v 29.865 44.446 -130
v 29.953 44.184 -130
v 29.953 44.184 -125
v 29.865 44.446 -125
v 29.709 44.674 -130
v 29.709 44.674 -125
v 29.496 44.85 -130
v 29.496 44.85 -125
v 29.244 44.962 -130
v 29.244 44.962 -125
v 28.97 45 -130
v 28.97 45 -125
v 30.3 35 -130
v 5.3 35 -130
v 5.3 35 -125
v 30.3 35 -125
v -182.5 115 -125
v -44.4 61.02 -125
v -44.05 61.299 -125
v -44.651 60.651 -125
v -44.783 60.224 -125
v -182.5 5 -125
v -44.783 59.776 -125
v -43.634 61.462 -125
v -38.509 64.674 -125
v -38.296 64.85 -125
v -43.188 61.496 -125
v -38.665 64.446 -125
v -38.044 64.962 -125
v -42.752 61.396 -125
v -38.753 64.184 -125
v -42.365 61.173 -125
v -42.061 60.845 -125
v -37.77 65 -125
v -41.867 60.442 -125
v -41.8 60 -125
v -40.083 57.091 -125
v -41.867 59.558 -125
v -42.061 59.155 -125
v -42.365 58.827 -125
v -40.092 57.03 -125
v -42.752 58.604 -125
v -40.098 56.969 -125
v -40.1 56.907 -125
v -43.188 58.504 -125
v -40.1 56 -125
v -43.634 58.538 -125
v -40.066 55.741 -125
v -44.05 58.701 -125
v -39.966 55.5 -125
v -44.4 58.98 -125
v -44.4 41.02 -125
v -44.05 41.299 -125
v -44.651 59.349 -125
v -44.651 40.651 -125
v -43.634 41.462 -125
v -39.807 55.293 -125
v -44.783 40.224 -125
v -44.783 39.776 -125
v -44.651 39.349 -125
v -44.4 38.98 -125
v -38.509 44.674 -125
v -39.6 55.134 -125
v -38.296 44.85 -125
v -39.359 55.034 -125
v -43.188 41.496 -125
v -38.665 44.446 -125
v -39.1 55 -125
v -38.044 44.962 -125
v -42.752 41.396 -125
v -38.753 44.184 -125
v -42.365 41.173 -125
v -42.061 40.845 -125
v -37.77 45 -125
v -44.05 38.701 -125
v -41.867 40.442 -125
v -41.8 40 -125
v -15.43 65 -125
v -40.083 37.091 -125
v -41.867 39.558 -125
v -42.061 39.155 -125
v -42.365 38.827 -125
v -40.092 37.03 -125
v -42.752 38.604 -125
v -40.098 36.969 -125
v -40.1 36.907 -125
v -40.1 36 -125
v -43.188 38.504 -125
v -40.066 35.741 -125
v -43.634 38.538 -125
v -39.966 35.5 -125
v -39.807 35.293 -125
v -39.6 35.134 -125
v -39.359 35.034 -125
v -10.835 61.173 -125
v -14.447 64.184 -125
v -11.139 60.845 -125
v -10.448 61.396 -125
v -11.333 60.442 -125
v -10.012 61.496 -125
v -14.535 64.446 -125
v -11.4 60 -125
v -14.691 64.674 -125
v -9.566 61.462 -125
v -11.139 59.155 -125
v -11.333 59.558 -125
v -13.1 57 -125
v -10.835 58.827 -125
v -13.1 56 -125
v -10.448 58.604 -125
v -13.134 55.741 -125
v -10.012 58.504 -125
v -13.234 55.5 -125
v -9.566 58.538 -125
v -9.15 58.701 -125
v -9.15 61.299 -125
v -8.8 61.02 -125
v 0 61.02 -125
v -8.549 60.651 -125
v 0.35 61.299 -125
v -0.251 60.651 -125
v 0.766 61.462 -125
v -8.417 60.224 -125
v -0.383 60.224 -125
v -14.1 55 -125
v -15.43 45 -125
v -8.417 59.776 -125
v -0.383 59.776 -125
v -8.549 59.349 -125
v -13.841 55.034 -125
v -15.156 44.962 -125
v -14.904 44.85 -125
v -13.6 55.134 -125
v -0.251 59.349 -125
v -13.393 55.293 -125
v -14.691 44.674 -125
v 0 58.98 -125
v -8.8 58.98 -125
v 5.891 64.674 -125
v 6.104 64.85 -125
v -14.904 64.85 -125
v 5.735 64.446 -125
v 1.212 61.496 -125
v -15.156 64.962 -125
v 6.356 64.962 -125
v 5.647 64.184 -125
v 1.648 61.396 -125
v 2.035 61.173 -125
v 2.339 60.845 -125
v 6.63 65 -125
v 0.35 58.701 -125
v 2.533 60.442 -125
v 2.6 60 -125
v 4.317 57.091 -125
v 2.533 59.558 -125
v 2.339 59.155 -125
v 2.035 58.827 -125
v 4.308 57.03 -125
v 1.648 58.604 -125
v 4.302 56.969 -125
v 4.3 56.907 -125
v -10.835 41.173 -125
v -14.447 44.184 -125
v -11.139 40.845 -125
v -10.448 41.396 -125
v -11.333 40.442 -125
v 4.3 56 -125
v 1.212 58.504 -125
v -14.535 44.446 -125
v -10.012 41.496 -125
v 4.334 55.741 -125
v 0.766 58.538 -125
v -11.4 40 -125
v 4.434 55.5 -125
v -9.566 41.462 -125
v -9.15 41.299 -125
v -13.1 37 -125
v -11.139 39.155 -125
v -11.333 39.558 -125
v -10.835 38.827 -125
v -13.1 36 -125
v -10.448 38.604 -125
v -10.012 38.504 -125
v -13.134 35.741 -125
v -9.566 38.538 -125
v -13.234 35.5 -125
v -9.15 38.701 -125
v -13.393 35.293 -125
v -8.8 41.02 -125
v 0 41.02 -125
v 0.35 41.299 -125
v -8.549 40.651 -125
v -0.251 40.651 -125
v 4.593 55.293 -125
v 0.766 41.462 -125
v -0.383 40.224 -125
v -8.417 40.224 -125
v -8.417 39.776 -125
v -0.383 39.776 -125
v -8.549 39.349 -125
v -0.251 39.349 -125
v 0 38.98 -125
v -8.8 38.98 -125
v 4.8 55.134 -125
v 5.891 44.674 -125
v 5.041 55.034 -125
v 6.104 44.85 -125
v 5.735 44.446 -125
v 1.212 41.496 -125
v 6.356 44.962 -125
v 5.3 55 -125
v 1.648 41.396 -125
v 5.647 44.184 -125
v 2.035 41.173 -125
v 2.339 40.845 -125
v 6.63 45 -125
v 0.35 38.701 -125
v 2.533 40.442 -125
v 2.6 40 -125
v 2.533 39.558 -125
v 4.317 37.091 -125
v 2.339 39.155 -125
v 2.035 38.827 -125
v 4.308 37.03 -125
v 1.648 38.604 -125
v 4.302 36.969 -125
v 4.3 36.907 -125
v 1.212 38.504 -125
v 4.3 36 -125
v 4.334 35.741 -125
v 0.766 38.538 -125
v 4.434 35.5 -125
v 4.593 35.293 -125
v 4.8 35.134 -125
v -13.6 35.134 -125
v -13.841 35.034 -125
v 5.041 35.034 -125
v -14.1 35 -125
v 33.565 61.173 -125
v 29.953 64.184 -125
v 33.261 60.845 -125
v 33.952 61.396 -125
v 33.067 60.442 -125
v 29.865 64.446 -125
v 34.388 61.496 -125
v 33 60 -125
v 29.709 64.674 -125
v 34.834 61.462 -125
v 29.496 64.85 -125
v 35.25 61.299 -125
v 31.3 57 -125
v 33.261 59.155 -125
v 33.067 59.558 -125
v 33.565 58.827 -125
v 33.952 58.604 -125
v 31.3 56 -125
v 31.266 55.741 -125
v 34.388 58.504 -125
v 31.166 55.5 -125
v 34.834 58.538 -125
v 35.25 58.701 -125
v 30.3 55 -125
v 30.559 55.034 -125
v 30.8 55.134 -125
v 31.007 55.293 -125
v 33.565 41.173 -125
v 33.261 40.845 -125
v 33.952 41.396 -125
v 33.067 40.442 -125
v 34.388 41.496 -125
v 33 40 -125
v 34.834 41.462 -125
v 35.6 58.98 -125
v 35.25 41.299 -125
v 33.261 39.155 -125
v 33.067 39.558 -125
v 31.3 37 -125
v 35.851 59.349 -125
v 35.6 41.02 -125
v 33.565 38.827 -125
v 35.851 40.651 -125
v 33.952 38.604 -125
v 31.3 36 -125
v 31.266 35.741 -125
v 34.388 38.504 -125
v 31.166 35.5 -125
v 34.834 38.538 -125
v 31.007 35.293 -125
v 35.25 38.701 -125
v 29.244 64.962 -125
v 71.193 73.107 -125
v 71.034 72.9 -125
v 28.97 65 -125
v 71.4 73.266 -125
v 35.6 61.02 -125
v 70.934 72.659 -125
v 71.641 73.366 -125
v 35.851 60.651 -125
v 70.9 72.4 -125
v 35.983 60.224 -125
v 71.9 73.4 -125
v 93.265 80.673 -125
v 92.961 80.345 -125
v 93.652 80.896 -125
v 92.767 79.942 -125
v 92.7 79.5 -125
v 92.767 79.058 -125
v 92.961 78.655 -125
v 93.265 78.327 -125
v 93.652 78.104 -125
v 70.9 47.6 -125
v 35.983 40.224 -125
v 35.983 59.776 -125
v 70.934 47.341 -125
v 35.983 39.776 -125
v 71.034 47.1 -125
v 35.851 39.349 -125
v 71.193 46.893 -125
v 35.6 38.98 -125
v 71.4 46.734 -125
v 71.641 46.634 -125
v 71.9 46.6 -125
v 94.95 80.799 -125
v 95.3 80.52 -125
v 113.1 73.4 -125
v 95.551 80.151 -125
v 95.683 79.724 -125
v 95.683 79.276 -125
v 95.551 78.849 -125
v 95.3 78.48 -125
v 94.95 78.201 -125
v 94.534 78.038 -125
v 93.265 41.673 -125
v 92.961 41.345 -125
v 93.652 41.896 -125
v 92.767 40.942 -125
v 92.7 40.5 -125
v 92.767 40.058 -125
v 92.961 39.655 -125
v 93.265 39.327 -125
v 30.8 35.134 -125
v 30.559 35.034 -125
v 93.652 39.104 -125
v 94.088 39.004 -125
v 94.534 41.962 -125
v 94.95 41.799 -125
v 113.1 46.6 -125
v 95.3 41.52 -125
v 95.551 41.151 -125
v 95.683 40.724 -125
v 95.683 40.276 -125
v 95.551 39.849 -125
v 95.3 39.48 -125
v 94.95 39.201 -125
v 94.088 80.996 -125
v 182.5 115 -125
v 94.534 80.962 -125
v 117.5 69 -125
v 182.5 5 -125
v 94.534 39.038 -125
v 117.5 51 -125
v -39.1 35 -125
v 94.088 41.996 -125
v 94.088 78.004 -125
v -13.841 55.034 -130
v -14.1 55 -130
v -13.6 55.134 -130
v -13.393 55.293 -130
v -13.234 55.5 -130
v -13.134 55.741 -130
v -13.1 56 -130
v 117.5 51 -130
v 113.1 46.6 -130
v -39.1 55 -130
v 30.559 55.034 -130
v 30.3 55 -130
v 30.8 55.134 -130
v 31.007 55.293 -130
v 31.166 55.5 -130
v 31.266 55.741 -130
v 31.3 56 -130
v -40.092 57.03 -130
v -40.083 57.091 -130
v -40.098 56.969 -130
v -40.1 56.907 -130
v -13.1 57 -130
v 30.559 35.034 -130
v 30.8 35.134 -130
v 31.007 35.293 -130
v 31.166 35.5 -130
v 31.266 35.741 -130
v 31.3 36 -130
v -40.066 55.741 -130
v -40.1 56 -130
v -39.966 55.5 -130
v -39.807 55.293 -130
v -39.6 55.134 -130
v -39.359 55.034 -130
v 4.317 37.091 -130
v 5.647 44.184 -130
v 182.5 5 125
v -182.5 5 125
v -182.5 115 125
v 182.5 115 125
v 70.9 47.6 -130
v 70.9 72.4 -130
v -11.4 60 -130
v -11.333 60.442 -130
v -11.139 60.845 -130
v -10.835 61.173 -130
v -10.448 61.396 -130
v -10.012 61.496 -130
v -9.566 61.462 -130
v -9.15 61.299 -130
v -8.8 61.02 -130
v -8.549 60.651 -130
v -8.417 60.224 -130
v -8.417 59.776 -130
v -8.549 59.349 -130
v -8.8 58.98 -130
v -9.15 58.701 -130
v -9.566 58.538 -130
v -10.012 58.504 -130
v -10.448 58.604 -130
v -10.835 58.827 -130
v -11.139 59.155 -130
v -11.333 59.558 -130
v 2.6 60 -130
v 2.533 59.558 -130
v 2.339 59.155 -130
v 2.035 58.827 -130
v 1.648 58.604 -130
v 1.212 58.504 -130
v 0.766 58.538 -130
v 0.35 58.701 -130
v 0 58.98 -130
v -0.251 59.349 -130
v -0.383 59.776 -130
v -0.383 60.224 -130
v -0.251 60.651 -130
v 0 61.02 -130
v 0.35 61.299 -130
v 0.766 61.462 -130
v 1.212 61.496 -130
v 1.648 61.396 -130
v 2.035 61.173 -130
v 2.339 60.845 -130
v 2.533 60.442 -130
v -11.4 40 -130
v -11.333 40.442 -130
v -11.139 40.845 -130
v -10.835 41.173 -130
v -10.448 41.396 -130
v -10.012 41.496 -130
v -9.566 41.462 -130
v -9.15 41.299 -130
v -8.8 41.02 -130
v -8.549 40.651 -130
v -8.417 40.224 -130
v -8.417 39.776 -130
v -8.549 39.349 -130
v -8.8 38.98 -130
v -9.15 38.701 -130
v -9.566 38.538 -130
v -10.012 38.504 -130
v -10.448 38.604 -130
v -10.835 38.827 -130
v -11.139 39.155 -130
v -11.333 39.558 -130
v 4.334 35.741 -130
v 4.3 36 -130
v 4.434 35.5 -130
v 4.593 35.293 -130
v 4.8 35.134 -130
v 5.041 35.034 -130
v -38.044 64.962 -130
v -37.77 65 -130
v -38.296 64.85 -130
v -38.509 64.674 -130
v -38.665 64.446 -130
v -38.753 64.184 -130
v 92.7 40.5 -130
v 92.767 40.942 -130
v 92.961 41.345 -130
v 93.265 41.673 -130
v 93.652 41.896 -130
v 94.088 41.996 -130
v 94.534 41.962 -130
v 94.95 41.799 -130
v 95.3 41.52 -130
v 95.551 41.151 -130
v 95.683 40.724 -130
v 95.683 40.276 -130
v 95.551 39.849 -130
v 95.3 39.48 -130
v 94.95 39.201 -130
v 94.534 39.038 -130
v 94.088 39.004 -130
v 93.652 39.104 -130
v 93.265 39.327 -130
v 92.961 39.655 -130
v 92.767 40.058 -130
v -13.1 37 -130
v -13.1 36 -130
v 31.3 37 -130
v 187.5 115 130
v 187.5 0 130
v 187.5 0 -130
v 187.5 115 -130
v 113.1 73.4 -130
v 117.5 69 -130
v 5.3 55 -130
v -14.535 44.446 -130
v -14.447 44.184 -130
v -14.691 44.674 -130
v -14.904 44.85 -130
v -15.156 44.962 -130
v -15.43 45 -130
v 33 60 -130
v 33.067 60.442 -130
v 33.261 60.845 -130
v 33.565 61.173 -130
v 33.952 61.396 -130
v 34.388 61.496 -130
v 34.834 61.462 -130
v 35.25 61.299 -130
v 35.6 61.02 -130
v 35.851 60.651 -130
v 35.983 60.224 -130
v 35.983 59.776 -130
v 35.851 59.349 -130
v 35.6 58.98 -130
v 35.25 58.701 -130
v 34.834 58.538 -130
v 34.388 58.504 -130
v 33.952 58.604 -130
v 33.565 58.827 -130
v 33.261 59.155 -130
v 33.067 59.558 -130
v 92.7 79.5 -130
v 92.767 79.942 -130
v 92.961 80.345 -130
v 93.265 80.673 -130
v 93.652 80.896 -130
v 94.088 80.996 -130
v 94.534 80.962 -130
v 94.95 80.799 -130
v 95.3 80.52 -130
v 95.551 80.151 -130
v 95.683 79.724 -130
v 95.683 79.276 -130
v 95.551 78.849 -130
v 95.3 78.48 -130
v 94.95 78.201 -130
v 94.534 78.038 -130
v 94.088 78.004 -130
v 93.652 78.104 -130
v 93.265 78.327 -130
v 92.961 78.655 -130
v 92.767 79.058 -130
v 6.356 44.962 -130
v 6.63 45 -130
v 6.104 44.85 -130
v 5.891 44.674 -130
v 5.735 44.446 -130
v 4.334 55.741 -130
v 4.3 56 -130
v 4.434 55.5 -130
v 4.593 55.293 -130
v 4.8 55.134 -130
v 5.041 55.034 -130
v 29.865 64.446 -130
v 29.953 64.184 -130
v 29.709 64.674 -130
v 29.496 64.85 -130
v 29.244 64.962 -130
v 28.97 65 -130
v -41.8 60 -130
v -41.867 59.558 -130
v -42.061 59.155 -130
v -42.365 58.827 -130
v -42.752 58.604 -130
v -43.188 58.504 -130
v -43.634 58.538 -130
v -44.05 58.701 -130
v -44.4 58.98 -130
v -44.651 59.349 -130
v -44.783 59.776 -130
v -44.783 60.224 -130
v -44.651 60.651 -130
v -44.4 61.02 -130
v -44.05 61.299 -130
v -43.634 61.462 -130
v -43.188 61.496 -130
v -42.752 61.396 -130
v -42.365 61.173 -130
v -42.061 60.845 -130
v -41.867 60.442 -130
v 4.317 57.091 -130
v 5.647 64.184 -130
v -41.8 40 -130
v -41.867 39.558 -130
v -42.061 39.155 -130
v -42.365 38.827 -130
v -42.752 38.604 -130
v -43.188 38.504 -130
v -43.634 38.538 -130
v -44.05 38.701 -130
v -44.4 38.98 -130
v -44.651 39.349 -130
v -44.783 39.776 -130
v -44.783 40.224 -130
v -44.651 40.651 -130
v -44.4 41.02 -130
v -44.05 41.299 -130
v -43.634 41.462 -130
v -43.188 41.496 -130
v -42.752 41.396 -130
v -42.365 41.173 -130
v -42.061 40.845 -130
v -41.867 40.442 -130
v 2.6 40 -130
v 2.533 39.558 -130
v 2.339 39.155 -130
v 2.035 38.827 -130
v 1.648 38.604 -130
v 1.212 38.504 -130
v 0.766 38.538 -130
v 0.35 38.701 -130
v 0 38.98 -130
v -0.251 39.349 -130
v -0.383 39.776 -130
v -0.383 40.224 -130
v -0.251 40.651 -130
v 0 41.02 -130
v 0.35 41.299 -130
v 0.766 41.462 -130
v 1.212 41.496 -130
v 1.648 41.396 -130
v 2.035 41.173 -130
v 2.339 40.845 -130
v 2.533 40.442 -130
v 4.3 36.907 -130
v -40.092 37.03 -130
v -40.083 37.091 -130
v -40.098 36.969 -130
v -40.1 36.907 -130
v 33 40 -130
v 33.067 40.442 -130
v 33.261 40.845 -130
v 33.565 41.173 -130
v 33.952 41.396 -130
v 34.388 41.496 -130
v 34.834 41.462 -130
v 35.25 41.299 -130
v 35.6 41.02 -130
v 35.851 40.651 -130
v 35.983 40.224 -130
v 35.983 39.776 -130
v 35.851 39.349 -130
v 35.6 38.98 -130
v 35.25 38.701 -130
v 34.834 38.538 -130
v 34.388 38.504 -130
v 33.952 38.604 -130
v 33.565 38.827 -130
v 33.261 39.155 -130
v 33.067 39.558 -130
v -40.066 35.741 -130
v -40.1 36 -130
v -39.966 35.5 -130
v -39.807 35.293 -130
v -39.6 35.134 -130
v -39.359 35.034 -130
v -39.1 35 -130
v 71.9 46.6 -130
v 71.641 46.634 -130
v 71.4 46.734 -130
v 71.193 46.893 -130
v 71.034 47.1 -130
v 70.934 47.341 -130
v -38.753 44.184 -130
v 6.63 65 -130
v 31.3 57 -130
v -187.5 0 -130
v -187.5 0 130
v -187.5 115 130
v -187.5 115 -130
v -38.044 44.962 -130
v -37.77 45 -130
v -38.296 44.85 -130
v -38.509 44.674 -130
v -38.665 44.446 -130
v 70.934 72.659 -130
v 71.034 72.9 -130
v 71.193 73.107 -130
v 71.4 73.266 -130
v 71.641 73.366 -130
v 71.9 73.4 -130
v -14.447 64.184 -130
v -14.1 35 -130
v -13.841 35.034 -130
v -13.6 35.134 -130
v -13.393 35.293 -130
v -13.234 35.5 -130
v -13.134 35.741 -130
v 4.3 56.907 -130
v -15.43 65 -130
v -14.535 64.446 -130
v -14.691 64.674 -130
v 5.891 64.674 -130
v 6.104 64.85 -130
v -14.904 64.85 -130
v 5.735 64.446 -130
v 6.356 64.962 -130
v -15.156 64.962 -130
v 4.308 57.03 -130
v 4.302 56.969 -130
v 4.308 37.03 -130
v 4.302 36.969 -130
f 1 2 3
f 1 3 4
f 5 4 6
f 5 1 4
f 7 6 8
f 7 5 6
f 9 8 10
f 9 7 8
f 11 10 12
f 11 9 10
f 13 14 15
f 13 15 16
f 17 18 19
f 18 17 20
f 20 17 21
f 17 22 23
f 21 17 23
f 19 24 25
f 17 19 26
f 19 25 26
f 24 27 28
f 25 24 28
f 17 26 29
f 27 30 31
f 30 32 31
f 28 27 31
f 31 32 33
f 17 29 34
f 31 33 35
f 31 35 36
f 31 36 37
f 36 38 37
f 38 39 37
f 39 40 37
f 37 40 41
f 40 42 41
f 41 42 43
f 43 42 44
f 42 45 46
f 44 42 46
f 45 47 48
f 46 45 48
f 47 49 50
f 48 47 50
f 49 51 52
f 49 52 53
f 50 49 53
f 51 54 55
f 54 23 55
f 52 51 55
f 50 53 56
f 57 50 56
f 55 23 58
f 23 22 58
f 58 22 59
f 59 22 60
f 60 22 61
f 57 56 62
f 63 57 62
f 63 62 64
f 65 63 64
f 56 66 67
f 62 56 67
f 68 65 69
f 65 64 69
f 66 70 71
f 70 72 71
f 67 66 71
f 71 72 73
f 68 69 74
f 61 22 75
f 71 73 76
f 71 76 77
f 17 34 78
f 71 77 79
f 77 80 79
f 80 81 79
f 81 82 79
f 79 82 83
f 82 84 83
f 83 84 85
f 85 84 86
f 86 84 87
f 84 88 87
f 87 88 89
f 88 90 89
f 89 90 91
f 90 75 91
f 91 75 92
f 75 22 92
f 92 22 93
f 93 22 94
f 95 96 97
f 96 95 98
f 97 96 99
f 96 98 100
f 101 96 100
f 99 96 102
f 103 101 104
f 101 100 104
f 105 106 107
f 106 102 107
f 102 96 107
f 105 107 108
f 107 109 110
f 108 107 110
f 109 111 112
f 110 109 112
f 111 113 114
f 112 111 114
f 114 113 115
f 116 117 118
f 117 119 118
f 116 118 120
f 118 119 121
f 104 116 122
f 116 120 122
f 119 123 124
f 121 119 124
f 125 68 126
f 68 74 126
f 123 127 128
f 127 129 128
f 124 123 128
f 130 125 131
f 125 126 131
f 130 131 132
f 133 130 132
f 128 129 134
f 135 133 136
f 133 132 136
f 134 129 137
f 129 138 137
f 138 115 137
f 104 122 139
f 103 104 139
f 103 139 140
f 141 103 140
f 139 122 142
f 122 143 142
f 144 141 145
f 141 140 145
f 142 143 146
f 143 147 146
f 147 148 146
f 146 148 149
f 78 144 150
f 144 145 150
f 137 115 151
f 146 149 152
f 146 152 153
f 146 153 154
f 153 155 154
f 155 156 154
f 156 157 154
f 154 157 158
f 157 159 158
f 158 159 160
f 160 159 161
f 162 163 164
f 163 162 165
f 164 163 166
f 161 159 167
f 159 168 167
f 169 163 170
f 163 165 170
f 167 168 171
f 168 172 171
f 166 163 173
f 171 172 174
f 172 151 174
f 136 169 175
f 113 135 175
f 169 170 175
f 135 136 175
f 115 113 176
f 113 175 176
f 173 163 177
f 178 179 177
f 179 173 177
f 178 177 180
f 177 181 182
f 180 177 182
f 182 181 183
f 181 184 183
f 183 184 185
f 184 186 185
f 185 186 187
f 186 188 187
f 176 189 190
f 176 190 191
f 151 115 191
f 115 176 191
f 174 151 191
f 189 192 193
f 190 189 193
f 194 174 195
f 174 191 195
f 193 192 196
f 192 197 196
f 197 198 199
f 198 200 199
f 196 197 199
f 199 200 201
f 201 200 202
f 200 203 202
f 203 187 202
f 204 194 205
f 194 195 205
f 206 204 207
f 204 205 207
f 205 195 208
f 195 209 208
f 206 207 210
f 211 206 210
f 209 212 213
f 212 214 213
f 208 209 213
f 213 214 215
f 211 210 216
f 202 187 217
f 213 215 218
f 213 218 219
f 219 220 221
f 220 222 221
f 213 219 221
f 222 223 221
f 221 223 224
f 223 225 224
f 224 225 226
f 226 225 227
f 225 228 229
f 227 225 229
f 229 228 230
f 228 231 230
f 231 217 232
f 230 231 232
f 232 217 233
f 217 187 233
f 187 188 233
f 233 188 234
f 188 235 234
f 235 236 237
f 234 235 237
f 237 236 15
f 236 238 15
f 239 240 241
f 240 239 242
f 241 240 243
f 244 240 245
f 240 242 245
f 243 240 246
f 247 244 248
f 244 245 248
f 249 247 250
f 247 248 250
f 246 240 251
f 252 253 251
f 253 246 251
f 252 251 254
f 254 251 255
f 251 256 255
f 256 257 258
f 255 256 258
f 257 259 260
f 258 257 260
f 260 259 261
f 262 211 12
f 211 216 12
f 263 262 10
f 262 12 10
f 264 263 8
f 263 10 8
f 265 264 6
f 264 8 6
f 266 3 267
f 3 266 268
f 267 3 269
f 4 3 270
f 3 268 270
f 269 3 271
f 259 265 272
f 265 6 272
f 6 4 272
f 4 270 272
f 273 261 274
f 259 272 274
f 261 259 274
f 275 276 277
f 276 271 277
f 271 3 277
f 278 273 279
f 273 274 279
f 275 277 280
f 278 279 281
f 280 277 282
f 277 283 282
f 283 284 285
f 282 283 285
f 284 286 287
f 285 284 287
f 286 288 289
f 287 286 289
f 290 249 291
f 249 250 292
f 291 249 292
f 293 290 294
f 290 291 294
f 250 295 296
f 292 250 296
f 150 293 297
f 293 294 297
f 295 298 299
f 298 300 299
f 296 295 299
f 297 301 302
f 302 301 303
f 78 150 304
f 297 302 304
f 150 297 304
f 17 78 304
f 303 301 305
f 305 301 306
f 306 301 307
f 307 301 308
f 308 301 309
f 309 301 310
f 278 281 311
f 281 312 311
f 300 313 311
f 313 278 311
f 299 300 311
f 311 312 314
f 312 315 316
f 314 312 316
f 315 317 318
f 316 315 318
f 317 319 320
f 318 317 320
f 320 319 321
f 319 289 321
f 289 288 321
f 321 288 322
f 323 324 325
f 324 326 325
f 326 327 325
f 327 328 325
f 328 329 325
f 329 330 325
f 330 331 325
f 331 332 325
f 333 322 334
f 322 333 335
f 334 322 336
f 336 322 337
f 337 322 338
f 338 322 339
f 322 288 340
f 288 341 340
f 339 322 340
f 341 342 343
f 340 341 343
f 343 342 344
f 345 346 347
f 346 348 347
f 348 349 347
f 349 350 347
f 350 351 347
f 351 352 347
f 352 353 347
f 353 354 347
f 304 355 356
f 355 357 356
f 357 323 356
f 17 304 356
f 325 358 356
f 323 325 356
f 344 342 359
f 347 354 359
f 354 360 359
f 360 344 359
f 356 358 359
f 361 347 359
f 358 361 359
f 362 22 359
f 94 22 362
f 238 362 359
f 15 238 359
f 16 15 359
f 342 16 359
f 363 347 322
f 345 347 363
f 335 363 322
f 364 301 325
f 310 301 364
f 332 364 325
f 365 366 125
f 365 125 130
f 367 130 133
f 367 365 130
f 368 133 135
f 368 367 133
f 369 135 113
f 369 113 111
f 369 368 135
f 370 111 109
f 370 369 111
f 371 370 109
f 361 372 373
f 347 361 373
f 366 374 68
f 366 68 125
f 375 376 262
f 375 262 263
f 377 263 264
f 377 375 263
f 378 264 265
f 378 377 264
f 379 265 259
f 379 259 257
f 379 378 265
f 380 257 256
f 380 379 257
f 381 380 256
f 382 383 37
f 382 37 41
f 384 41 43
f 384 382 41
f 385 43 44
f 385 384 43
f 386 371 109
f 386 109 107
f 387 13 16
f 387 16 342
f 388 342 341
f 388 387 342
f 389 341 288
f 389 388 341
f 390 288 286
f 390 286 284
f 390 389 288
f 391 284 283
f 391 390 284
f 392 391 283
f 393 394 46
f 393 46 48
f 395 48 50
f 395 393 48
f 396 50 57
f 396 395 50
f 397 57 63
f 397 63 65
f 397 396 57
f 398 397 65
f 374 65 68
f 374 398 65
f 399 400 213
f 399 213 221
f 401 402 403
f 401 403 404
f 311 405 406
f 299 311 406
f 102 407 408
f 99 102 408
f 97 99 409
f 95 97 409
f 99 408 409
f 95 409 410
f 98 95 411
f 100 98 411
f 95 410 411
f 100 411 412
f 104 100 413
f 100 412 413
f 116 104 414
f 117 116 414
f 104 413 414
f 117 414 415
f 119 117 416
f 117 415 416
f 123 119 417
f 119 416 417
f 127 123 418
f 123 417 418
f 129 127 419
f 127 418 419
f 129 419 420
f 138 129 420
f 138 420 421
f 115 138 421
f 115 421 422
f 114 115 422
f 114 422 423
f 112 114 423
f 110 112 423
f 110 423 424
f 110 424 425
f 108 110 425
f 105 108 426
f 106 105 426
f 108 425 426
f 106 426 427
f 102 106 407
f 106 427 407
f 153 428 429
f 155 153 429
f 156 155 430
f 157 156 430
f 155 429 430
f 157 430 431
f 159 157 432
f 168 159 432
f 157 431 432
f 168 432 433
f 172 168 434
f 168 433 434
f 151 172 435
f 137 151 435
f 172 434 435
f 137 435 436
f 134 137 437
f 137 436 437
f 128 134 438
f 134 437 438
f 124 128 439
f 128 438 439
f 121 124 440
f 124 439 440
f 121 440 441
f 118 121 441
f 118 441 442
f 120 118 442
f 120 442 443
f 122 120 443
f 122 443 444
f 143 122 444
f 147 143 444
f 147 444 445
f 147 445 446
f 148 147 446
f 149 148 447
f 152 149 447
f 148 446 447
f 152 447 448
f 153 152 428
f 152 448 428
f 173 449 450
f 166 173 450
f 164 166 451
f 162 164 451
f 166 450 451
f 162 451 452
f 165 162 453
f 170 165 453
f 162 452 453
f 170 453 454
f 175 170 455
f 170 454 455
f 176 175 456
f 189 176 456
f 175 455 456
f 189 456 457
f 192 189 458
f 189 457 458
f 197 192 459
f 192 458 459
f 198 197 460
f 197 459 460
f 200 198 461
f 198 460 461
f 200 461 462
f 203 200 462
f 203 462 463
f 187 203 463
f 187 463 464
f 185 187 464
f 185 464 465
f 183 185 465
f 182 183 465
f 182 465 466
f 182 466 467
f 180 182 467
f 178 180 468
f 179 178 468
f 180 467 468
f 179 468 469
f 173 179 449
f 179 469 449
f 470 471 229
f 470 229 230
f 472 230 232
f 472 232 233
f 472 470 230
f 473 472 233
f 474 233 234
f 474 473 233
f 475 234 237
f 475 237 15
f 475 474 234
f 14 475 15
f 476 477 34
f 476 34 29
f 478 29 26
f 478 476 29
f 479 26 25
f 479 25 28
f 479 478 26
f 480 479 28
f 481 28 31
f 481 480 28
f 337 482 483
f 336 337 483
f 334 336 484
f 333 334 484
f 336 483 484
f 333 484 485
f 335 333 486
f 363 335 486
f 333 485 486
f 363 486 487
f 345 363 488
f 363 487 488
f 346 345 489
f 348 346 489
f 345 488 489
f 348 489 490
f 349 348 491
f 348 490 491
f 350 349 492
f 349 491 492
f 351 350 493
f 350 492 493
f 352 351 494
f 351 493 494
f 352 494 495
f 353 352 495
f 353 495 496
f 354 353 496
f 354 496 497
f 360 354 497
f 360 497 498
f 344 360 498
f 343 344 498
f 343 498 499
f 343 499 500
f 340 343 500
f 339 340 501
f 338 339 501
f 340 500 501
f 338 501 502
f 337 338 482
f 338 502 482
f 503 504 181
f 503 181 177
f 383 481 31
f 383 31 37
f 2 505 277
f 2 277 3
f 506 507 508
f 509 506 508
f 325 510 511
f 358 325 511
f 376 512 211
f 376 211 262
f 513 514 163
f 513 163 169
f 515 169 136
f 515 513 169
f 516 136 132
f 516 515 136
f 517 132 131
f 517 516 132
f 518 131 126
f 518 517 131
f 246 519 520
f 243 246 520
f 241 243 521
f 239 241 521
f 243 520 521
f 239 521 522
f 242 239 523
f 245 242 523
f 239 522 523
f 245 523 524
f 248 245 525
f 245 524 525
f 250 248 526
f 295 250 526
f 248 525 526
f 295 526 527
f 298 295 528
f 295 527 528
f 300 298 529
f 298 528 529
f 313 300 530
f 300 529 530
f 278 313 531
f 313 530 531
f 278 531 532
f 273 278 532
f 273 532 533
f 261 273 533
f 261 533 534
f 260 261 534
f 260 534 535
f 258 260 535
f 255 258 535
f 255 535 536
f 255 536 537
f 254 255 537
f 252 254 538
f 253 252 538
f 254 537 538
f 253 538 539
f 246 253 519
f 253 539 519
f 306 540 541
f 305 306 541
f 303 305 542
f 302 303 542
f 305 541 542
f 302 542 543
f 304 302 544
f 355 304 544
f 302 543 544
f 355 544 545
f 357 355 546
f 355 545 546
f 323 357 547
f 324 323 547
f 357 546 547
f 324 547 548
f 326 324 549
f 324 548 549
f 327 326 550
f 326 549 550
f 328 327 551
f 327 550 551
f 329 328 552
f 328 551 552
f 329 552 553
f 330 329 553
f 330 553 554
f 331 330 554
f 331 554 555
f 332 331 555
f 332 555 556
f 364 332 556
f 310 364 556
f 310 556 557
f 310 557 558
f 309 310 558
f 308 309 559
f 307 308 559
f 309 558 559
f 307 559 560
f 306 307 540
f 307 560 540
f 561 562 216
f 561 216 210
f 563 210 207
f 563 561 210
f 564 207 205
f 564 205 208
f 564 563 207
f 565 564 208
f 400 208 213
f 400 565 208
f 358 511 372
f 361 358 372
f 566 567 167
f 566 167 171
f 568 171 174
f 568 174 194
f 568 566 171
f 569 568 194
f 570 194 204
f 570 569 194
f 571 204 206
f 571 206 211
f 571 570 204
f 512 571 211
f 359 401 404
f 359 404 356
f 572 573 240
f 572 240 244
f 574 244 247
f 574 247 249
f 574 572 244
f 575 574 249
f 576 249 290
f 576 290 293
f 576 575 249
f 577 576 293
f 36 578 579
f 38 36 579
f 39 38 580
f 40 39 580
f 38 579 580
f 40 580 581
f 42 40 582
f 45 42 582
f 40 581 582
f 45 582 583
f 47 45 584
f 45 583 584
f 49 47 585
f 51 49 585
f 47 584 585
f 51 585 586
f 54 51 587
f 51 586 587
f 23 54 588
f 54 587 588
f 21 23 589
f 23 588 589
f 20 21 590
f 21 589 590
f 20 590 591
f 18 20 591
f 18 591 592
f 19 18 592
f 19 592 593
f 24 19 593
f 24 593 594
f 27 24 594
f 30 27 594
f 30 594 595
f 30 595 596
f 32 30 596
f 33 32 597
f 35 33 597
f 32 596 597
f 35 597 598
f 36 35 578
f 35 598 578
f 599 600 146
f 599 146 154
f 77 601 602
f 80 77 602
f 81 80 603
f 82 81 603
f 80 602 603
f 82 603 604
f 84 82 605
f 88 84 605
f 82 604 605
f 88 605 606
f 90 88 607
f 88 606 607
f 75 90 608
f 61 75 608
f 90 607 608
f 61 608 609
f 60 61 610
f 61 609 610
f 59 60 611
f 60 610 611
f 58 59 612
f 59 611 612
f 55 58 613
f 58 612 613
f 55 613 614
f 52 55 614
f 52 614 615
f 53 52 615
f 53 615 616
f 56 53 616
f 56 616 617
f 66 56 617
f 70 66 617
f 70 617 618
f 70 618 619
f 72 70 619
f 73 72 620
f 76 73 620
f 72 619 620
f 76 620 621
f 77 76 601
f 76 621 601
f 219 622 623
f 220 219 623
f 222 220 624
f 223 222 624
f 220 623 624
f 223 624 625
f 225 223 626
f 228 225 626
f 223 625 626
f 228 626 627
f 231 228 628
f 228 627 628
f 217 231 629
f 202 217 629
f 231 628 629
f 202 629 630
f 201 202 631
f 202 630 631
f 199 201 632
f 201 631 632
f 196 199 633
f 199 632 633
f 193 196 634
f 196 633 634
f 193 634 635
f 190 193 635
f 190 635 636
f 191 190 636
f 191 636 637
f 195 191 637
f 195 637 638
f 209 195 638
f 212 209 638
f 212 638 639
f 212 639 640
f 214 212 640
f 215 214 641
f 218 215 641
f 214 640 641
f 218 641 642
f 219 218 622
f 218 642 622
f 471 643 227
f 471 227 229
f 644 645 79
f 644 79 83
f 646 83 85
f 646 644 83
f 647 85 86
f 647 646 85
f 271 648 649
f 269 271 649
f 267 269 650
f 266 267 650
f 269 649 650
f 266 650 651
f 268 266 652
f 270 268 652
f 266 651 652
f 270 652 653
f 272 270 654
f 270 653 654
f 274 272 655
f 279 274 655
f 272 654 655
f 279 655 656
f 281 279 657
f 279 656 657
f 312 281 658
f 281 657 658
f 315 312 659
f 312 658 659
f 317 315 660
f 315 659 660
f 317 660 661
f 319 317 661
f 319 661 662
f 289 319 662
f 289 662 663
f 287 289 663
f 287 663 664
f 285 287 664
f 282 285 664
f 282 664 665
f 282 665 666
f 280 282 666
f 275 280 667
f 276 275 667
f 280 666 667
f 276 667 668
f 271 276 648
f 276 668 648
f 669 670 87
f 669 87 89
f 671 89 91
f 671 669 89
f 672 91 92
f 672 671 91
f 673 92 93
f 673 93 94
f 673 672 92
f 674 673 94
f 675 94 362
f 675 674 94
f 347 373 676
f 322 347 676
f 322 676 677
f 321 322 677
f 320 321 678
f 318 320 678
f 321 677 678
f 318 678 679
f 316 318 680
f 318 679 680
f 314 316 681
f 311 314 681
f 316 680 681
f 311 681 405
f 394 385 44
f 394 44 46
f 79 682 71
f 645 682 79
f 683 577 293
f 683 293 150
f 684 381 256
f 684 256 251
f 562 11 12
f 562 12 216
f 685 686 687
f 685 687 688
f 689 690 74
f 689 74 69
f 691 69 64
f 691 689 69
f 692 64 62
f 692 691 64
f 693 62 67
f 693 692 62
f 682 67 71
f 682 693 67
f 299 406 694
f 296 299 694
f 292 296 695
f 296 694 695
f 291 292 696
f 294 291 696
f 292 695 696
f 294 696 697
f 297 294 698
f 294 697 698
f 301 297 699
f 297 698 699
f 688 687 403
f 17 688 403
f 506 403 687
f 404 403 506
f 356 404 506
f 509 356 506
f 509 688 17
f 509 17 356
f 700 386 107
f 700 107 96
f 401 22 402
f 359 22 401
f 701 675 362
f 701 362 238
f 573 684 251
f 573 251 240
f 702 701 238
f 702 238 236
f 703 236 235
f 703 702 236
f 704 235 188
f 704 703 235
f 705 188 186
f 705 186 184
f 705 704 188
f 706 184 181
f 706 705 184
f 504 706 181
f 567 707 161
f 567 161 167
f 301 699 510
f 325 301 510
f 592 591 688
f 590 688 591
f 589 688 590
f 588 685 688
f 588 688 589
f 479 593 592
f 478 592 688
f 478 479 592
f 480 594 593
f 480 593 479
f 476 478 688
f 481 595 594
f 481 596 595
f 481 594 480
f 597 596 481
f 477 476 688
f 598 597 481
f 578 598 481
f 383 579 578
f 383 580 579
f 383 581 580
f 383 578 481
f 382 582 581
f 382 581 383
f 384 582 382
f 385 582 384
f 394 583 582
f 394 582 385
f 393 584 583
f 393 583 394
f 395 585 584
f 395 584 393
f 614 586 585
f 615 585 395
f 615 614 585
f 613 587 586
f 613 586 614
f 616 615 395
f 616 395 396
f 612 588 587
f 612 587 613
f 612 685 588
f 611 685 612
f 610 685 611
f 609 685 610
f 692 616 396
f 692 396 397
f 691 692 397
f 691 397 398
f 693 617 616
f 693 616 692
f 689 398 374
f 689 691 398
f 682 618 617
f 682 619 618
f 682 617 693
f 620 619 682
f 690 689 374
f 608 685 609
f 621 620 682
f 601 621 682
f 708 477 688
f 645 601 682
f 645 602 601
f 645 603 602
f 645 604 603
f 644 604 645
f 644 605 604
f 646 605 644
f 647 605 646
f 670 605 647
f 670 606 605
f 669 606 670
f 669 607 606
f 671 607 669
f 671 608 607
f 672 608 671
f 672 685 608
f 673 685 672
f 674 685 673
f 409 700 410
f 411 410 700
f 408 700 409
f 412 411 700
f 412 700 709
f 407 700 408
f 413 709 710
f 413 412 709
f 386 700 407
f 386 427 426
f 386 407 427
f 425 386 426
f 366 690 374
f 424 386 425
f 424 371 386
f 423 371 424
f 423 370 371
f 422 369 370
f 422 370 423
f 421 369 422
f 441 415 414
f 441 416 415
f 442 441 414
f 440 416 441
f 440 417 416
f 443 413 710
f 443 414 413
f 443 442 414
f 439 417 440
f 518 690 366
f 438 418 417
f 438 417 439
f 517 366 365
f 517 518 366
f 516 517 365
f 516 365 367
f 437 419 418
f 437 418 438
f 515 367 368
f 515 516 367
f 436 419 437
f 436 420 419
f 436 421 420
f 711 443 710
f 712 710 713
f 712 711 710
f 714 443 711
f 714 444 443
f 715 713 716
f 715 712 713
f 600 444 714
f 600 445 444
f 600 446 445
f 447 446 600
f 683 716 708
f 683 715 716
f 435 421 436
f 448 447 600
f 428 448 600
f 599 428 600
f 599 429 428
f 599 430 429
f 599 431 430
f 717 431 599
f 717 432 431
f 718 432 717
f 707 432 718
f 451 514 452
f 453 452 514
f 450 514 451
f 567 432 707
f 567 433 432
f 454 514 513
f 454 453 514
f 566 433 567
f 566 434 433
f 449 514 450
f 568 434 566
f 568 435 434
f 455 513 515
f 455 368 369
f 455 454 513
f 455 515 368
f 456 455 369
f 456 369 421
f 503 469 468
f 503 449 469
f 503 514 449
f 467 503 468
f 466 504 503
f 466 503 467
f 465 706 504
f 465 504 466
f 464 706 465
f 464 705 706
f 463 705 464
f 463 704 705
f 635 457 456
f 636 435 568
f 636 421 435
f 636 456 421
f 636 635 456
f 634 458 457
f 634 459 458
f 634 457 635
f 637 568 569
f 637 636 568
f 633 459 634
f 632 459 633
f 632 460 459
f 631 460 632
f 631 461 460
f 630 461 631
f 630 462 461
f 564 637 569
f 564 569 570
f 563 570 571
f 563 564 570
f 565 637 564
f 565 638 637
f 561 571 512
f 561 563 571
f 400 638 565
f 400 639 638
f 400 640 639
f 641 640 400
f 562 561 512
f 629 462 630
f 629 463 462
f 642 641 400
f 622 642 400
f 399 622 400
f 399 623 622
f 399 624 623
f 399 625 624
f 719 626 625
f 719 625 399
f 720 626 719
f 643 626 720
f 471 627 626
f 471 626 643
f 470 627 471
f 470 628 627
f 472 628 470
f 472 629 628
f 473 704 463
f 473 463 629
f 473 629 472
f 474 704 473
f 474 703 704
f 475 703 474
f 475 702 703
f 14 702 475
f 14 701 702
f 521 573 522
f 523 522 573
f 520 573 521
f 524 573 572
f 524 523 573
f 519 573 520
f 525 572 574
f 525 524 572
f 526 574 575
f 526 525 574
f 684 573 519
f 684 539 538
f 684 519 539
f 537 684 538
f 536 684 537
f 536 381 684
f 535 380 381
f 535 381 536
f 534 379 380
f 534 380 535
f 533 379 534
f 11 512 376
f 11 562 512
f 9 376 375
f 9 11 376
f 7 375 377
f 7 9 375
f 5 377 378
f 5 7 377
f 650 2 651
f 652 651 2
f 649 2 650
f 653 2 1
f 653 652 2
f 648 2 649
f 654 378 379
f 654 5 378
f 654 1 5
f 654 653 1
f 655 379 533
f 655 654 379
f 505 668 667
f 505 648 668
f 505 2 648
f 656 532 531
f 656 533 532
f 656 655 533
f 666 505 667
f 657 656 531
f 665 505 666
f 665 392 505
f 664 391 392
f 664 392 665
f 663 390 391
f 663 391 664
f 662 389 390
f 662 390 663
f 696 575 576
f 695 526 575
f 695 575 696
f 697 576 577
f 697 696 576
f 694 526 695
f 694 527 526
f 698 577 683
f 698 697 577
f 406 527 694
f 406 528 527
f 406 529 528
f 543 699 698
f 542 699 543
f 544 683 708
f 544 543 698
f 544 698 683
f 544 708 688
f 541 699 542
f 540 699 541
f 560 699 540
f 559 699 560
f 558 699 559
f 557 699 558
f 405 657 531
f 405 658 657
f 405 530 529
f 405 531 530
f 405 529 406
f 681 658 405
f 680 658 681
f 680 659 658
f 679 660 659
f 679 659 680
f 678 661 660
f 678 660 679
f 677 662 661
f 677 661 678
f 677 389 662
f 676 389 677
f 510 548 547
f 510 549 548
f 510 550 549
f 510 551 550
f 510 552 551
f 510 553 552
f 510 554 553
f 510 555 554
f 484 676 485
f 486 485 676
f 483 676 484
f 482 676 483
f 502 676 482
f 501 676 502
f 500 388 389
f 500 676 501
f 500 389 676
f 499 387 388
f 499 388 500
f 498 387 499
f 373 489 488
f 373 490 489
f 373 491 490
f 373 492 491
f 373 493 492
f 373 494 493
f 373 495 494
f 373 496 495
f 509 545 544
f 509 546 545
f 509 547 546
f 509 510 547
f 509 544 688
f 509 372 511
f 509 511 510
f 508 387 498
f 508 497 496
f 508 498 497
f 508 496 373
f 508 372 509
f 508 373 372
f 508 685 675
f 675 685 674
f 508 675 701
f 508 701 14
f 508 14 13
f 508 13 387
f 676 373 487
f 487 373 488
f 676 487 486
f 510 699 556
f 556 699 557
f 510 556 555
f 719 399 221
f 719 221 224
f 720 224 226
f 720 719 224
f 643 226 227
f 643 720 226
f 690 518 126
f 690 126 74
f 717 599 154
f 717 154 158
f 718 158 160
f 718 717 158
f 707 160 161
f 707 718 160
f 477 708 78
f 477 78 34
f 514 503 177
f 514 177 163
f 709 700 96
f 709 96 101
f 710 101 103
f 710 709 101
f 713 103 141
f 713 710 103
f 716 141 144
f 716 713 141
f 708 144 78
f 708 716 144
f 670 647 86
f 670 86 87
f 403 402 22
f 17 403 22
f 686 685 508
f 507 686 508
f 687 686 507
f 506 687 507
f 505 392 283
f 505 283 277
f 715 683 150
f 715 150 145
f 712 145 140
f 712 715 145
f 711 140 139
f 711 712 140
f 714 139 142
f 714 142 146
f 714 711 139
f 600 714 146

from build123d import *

# Parameters (mm, degrees)
SKETCH_1_W          = 375
SKETCH_1_H          = 260
EXTRUDE_1_DEPTH     = 115
SHELL_1_T           = -5
SKETCH_2_R          = 1.5
CUT_EXTRUDE_1_DEPTH = 5


with BuildPart() as part:
    # Эскиз1 → Бобышка-Вытянуть1 (new body)
    with BuildSketch(Plane(origin=(0, 0, 0), x_dir=(1, 0, 0), z_dir=(0, 1, 0))):
        Rectangle(SKETCH_1_W, SKETCH_1_H)
    extrude(amount=EXTRUDE_1_DEPTH)

    # Оболочка1
    shell_1_openings = [part.faces().sort_by_distance(p)[0] for p in [
        (0, 115, 0),
    ]]
    offset(amount=SHELL_1_T, openings=shell_1_openings, kind=Kind.INTERSECTION)

    # Эскиз2 → Вырез-Вытянуть1 (cut)
    with BuildSketch(Plane(origin=(0, 0, -130), x_dir=(-1, 0, 0), z_dir=(0, 0, -1))):
        with Locations((-34.5, 60)):
            Circle(SKETCH_2_R)
        with Locations(Location((-1.1, 60, 0), (0, 0, 180))):
            Circle(SKETCH_2_R)
        with Locations((9.9, 60)):
            Circle(SKETCH_2_R)
        with Locations(Location((43.3, 60, 0), (0, 0, 180))):
            Circle(SKETCH_2_R)
        with Locations((-34.5, 40)):
            Circle(SKETCH_2_R)
        with Locations(Location((-1.1, 40, 0), (0, 0, 180))):
            Circle(SKETCH_2_R)
        with Locations((9.9, 40)):
            Circle(SKETCH_2_R)
        with Locations(Location((43.3, 40, 0), (0, 0, 180))):
            Circle(SKETCH_2_R)
        with Locations((-94.2, 40.5)):
            Circle(SKETCH_2_R)
        with Locations((-94.2, 79.5)):
            Circle(SKETCH_2_R)
        with BuildLine():
            Line((-31.3, 57), (-29.9529459, 64.184288535))
            ThreePointArc((-29.9529459, 64.184288535), (-29.60870955, 64.769509108), (-28.970073713, 65))
            Line((-28.970073713, 65), (-6.629926287, 65))
            ThreePointArc((-6.629926287, 65), (-5.99129045, 64.769509108), (-5.6470541, 64.184288535))
            Line((-5.6470541, 64.184288535), (-4.317127813, 57.091348336))
            ThreePointArc((-4.317127813, 57.091348336), (-4.30429116, 56.999601179), (-4.3, 56.907059801))
            Line((-4.3, 56.907059801), (-4.3, 56))
            ThreePointArc((-4.3, 56), (-4.592893219, 55.292893219), (-5.3, 55))
            Line((-5.3, 55), (-30.3, 55))
            ThreePointArc((-30.3, 55), (-31.007106781, 55.292893219), (-31.3, 56))
            Line((-31.3, 56), (-31.3, 57))
        make_face()
        with BuildLine():
            Line((13.1, 57), (14.4470541, 64.184288535))
            ThreePointArc((14.4470541, 64.184288535), (14.79129045, 64.769509108), (15.429926287, 65))
            Line((15.429926287, 65), (37.770073713, 65))
            ThreePointArc((37.770073713, 65), (38.40870955, 64.769509108), (38.7529459, 64.184288535))
            Line((38.7529459, 64.184288535), (40.082872187, 57.091348336))
            ThreePointArc((40.082872187, 57.091348336), (40.09570884, 56.999601179), (40.1, 56.907059801))
            Line((40.1, 56.907059801), (40.1, 56))
            ThreePointArc((40.1, 56), (39.807106781, 55.292893219), (39.1, 55))
            Line((39.1, 55), (14.1, 55))
            ThreePointArc((14.1, 55), (13.392893219, 55.292893219), (13.1, 56))
            Line((13.1, 56), (13.1, 57))
        make_face()
        with BuildLine():
            Line((-31.3, 37), (-29.9529459, 44.184288535))
            ThreePointArc((-29.9529459, 44.184288535), (-29.60870955, 44.769509108), (-28.970073713, 45))
            Line((-28.970073713, 45), (-6.629926287, 45))
            ThreePointArc((-6.629926287, 45), (-5.99129045, 44.769509108), (-5.6470541, 44.184288535))
            Line((-5.6470541, 44.184288535), (-4.317127813, 37.091348336))
            ThreePointArc((-4.317127813, 37.091348336), (-4.30429116, 36.999601179), (-4.3, 36.907059801))
            Line((-4.3, 36.907059801), (-4.3, 36))
            ThreePointArc((-4.3, 36), (-4.592893219, 35.292893219), (-5.3, 35))
            Line((-5.3, 35), (-30.3, 35))
            ThreePointArc((-30.3, 35), (-31.007106781, 35.292893219), (-31.3, 36))
            Line((-31.3, 36), (-31.3, 37))
        make_face()
        with BuildLine():
            Line((13.1, 37), (14.4470541, 44.184288535))
            ThreePointArc((14.4470541, 44.184288535), (14.79129045, 44.769509108), (15.429926287, 45))
            Line((15.429926287, 45), (37.770073713, 45))
            ThreePointArc((37.770073713, 45), (38.40870955, 44.769509108), (38.7529459, 44.184288535))
            Line((38.7529459, 44.184288535), (40.082872187, 37.091348336))
            ThreePointArc((40.082872187, 37.091348336), (40.09570884, 36.999601179), (40.1, 36.907059801))
            Line((40.1, 36.907059801), (40.1, 36))
            ThreePointArc((40.1, 36), (39.807106781, 35.292893219), (39.1, 35))
            Line((39.1, 35), (14.1, 35))
            ThreePointArc((14.1, 35), (13.392893219, 35.292893219), (13.1, 36))
            Line((13.1, 36), (13.1, 37))
        make_face()
        with BuildLine():
            Line((-113.1, 46.6), (-71.9, 46.6))
            ThreePointArc((-71.9, 46.6), (-71.192893219, 46.892893219), (-70.9, 47.6))
            Line((-70.9, 47.6), (-70.9, 72.4))
            ThreePointArc((-70.9, 72.4), (-71.192893219, 73.107106781), (-71.9, 73.4))
            Line((-71.9, 73.4), (-113.1, 73.4))
            Line((-113.1, 73.4), (-117.5, 69))
            Line((-117.5, 69), (-117.5, 51))
            Line((-117.5, 51), (-113.1, 46.6))
        make_face()
    extrude(amount=-CUT_EXTRUDE_1_DEPTH, mode=Mode.SUBTRACT)


solid = part.part
